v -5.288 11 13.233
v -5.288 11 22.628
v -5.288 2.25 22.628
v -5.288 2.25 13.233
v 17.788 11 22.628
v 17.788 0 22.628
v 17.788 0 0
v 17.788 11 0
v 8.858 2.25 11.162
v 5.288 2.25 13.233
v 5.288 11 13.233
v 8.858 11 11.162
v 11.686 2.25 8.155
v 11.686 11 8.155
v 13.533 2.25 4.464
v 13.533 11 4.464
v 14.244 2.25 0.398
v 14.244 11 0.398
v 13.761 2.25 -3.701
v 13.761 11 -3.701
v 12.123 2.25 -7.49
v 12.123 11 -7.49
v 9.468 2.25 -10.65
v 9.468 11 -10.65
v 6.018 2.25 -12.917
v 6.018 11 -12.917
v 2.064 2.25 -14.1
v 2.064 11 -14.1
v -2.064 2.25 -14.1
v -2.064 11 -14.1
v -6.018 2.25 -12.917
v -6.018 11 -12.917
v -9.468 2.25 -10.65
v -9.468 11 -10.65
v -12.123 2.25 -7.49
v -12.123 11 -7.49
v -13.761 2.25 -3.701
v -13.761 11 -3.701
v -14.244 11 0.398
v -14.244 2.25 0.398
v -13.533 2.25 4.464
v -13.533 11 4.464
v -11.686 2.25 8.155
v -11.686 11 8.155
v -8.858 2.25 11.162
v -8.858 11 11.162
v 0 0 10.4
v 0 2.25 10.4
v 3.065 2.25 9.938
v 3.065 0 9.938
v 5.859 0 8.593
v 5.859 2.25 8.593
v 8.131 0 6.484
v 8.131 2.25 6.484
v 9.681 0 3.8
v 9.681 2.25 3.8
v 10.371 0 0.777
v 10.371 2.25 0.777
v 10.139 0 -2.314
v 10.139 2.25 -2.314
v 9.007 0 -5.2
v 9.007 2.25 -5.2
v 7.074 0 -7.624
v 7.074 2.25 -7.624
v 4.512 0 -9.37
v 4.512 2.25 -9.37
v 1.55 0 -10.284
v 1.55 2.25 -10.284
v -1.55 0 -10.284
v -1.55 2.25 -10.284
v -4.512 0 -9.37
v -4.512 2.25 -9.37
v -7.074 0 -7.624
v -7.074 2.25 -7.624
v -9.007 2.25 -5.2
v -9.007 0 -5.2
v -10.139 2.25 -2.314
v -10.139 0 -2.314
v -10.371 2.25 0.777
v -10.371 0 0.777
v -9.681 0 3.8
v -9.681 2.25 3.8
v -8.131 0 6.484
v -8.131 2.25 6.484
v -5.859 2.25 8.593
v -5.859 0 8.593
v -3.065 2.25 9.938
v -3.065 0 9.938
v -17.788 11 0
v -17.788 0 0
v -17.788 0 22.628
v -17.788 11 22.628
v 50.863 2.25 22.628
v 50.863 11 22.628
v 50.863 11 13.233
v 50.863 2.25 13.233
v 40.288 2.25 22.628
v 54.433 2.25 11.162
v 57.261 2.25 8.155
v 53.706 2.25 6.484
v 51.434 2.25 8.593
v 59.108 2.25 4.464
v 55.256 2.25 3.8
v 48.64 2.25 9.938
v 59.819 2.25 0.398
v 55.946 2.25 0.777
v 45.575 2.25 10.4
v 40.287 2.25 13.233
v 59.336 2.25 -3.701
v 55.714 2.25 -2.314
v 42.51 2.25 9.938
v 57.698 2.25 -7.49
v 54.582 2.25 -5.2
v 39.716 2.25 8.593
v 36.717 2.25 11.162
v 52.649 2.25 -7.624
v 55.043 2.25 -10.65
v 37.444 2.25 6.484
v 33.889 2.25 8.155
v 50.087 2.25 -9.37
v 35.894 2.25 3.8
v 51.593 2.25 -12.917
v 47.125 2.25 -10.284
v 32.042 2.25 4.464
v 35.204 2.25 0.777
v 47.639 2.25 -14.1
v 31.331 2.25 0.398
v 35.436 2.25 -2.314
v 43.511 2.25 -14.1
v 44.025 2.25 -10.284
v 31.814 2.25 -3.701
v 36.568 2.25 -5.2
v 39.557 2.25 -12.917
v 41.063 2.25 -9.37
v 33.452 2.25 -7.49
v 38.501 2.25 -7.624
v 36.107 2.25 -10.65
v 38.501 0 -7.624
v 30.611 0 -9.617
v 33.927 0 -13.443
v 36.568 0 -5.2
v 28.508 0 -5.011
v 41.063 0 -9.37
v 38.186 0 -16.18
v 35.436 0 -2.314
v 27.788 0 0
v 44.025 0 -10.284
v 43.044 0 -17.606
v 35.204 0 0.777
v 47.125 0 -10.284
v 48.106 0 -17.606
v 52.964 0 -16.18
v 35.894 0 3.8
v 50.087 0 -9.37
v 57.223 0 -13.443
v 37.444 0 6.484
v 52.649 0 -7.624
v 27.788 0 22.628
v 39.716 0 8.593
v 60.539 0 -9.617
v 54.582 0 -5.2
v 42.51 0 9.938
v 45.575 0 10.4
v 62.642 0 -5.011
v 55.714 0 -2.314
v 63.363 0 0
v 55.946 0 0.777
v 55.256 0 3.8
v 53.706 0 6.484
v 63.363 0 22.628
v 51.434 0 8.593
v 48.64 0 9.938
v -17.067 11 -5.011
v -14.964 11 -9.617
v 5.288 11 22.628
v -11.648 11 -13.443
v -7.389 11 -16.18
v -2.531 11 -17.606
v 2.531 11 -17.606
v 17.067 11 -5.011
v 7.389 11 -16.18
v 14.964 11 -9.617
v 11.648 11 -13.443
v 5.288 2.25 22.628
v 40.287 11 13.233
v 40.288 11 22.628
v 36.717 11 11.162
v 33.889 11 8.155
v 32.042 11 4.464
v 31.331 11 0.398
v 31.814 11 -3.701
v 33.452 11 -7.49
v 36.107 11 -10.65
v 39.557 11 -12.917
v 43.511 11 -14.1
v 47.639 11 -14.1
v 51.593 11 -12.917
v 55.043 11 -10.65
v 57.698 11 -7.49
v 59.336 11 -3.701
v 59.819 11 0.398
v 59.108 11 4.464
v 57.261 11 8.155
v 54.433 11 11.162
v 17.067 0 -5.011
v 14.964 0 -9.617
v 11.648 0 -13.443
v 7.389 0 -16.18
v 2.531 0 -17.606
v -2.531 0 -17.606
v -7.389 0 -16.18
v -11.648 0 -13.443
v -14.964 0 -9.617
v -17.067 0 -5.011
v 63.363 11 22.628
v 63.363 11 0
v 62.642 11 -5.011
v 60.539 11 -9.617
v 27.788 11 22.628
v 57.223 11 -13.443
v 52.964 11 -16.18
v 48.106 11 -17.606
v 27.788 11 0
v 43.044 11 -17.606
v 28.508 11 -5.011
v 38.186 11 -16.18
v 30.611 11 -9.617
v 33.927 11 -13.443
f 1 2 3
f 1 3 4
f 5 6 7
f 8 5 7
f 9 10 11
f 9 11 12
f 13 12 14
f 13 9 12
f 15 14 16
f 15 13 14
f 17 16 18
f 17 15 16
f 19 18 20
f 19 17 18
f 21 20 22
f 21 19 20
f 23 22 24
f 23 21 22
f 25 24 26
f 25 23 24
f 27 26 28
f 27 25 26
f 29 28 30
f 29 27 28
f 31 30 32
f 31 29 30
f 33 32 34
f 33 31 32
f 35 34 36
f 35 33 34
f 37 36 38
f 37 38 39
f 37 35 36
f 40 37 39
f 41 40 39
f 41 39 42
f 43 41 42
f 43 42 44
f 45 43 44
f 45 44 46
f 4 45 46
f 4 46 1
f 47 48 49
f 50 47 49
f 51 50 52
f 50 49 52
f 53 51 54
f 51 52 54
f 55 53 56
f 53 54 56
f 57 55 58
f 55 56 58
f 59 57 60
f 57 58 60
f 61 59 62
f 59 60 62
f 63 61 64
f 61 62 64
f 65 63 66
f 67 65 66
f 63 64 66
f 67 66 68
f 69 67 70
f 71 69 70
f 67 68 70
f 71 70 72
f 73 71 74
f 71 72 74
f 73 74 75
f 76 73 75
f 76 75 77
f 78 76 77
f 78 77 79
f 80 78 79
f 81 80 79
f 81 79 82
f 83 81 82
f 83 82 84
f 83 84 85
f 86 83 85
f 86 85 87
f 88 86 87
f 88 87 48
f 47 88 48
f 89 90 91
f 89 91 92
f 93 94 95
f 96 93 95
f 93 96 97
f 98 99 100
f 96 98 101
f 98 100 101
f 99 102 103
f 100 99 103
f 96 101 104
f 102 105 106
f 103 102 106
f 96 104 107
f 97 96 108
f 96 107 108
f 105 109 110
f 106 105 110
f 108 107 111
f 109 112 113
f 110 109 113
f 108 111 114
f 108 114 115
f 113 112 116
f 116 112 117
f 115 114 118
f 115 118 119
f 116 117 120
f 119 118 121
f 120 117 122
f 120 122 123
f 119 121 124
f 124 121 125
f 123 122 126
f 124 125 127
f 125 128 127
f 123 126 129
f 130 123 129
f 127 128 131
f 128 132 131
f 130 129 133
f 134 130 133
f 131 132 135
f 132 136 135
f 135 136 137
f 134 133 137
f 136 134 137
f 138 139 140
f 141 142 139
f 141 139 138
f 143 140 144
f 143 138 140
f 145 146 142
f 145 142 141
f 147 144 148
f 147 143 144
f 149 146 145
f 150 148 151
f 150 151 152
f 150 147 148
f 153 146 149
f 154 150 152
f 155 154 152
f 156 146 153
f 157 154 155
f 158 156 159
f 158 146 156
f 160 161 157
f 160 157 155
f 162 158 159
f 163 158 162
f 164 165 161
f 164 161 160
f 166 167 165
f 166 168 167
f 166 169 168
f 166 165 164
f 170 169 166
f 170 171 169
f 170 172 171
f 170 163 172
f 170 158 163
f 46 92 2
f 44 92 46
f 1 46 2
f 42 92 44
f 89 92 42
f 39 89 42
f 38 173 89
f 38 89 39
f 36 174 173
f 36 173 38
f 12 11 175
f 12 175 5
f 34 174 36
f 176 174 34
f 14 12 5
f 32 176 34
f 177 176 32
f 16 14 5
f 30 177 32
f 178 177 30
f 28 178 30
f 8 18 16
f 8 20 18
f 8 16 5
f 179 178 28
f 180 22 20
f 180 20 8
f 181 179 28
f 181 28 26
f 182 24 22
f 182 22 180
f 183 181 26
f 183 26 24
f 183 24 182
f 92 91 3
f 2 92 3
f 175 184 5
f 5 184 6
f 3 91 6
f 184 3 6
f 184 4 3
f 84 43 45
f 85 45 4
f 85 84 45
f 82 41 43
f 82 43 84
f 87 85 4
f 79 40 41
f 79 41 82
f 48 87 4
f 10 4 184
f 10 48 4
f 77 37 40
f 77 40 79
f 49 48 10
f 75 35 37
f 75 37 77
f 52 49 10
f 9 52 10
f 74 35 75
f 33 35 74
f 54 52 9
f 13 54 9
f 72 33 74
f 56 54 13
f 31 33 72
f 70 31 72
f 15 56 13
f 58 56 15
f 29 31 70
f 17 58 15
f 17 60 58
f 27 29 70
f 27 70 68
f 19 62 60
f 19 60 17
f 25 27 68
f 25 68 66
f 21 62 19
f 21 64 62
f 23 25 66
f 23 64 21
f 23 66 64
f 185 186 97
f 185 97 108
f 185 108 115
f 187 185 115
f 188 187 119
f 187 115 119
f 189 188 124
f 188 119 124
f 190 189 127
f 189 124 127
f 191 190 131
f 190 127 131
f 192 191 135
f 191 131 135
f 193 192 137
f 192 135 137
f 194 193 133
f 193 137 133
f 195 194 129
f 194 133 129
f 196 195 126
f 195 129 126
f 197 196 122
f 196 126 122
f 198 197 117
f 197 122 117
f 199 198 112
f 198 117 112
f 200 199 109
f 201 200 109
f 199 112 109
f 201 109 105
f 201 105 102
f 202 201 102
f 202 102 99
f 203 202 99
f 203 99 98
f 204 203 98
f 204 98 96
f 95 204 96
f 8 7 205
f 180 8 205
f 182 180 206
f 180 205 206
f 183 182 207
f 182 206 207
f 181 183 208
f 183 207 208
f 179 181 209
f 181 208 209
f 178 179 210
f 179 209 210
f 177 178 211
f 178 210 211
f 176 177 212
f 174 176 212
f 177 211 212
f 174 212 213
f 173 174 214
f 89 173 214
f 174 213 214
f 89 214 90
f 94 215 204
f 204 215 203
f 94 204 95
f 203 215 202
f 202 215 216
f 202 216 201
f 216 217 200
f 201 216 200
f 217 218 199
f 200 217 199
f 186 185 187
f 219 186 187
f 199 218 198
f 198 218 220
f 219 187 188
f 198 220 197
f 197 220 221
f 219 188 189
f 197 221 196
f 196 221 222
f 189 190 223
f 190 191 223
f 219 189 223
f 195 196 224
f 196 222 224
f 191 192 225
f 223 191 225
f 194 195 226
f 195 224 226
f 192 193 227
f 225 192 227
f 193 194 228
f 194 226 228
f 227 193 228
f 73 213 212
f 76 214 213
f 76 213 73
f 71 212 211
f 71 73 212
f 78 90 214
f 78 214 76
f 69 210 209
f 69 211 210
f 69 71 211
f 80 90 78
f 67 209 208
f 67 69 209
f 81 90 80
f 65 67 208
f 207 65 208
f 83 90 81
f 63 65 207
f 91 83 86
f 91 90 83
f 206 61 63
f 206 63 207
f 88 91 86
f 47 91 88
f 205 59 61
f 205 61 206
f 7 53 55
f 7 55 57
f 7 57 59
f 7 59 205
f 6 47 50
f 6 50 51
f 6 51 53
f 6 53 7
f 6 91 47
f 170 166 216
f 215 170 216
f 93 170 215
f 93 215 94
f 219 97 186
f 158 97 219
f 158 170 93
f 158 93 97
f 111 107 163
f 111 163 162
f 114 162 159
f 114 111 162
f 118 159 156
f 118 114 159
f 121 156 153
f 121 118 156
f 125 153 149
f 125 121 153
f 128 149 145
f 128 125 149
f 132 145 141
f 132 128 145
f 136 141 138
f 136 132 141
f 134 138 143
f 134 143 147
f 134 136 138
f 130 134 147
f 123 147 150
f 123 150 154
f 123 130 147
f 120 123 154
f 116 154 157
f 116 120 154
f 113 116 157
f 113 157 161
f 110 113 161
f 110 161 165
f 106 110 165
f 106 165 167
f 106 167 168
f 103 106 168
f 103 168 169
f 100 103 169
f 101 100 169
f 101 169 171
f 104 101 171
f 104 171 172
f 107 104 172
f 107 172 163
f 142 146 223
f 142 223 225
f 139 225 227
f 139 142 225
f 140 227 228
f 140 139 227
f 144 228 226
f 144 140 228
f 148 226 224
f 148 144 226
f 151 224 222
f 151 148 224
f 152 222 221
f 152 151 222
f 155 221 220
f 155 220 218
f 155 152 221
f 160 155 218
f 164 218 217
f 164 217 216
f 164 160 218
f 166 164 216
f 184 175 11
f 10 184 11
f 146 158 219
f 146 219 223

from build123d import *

# Parameters (mm, degrees)
SKETCH1_R                = 14.25
BOSS_EXTRUDE1_DEPTH      = 11
SKETCH4_R                = 14.25
BOSS_EXTRUDE2_DEPTH      = 2.25
SKETCH5_R                = 10.4
CUT_EXTRUDE1_DEPTH       = 2.25
SKETCH3_W                = 10.575
SKETCH3_H                = 12.228258218
CUT_EXTRUDE5_DEPTH       = 8.75
BOSS_EXTRUDE3_DEPTH      = 5
BOSS_EXTRUDE3_DEPTH_BACK = 45
SKETCH7_W                = 40.575
SKETCH7_H                = 1.5
SKETCH8_W                = 81.15
SKETCH8_H                = 1.5
CUT_EXTRUDE6_DEPTH       = 60


with BuildPart() as part:
    # Sketch1 → Boss-Extrude1 (new body)
    with BuildSketch(Plane(origin=(0, 0, 0), x_dir=(1, 0, 0), z_dir=(0, 1, 0))):
        with BuildLine():
            Line((-17.7875, -22.628070726), (17.7875, -22.628070726))
            Line((17.7875, -22.628070726), (17.7875, 0))
            ThreePointArc((17.7875, 0), (0, 17.7875), (-17.7875, 0))
            Line((-17.7875, 0), (-17.7875, -22.628070726))
        make_face()
        with Locations(Location((0, 0, 0), (0, 0, 270))):
            Circle(SKETCH1_R, mode=Mode.SUBTRACT)
    extrude(amount=BOSS_EXTRUDE1_DEPTH)

    # Sketch4 → Boss-Extrude2 (add)
    with BuildSketch(Plane.XZ):
        with Locations(Location((0, 0, 0), (0, 0, 270))):
            Circle(SKETCH4_R)
    extrude(amount=-BOSS_EXTRUDE2_DEPTH)

    # Sketch5 → Cut-Extrude1 (cut)
    with BuildSketch(Plane(origin=(0, 2.25, 0), x_dir=(1, 0, 0), z_dir=(0, 1, 0))):
        with Locations(Location((0, 0, 0), (0, 0, 270))):
            Circle(SKETCH5_R)
    extrude(amount=-CUT_EXTRUDE1_DEPTH, mode=Mode.SUBTRACT)

    # Sketch3 → Cut-Extrude5 (cut)
    with BuildSketch(Plane(origin=(0, 11, 0), x_dir=(1, 0, 0), z_dir=(0, 1, 0))):
        with Locations((0, -16.513941617)):
            Rectangle(SKETCH3_W, SKETCH3_H)
    extrude(amount=-CUT_EXTRUDE5_DEPTH, mode=Mode.SUBTRACT)

    # Sketch7 → Boss-Extrude3 (add, two sides: drawn at the far end of the back side and taken through both)
    with BuildSketch(Plane.XY.offset(22.628070726).offset(-BOSS_EXTRUDE3_DEPTH_BACK)):
        with Locations((2.5, -0.75)):
            Rectangle(SKETCH7_W, SKETCH7_H)
    extrude(amount=BOSS_EXTRUDE3_DEPTH + BOSS_EXTRUDE3_DEPTH_BACK)

    # Mirror5: part across plane


with BuildPart() as part_1:
    add(part.part)
    add(part.part.mirror(Plane(origin=(22.7875, 0, 0), x_dir=(0, 0, 1), z_dir=(1, 0, 0))))

    # Sketch8 → Cut-Extrude6 (cut)
    with BuildSketch(Plane.XY.offset(27.628070726)):
        with Locations((22.7875, -0.75)):
            Rectangle(SKETCH8_W, SKETCH8_H)
    extrude(amount=-CUT_EXTRUDE6_DEPTH, mode=Mode.SUBTRACT)


with BuildPart() as cut_extrude6_piece_1:
    # of the separate pieces the step leaves, piece 1, a body of its own (cut_extrude6_pieces)
    add(part_1.part.solids().sort_by_distance((27.7875, 0, 0))[0])


with BuildPart() as cut_extrude6_piece_2:
    # of the separate pieces the step leaves, piece 2, a body of its own (cut_extrude6_pieces)
    add(part_1.part.solids().sort_by_distance((-17.7875, 0, 22.628070726))[0])


solid = Compound([cut_extrude6_piece_1.part, cut_extrude6_piece_2.part])
